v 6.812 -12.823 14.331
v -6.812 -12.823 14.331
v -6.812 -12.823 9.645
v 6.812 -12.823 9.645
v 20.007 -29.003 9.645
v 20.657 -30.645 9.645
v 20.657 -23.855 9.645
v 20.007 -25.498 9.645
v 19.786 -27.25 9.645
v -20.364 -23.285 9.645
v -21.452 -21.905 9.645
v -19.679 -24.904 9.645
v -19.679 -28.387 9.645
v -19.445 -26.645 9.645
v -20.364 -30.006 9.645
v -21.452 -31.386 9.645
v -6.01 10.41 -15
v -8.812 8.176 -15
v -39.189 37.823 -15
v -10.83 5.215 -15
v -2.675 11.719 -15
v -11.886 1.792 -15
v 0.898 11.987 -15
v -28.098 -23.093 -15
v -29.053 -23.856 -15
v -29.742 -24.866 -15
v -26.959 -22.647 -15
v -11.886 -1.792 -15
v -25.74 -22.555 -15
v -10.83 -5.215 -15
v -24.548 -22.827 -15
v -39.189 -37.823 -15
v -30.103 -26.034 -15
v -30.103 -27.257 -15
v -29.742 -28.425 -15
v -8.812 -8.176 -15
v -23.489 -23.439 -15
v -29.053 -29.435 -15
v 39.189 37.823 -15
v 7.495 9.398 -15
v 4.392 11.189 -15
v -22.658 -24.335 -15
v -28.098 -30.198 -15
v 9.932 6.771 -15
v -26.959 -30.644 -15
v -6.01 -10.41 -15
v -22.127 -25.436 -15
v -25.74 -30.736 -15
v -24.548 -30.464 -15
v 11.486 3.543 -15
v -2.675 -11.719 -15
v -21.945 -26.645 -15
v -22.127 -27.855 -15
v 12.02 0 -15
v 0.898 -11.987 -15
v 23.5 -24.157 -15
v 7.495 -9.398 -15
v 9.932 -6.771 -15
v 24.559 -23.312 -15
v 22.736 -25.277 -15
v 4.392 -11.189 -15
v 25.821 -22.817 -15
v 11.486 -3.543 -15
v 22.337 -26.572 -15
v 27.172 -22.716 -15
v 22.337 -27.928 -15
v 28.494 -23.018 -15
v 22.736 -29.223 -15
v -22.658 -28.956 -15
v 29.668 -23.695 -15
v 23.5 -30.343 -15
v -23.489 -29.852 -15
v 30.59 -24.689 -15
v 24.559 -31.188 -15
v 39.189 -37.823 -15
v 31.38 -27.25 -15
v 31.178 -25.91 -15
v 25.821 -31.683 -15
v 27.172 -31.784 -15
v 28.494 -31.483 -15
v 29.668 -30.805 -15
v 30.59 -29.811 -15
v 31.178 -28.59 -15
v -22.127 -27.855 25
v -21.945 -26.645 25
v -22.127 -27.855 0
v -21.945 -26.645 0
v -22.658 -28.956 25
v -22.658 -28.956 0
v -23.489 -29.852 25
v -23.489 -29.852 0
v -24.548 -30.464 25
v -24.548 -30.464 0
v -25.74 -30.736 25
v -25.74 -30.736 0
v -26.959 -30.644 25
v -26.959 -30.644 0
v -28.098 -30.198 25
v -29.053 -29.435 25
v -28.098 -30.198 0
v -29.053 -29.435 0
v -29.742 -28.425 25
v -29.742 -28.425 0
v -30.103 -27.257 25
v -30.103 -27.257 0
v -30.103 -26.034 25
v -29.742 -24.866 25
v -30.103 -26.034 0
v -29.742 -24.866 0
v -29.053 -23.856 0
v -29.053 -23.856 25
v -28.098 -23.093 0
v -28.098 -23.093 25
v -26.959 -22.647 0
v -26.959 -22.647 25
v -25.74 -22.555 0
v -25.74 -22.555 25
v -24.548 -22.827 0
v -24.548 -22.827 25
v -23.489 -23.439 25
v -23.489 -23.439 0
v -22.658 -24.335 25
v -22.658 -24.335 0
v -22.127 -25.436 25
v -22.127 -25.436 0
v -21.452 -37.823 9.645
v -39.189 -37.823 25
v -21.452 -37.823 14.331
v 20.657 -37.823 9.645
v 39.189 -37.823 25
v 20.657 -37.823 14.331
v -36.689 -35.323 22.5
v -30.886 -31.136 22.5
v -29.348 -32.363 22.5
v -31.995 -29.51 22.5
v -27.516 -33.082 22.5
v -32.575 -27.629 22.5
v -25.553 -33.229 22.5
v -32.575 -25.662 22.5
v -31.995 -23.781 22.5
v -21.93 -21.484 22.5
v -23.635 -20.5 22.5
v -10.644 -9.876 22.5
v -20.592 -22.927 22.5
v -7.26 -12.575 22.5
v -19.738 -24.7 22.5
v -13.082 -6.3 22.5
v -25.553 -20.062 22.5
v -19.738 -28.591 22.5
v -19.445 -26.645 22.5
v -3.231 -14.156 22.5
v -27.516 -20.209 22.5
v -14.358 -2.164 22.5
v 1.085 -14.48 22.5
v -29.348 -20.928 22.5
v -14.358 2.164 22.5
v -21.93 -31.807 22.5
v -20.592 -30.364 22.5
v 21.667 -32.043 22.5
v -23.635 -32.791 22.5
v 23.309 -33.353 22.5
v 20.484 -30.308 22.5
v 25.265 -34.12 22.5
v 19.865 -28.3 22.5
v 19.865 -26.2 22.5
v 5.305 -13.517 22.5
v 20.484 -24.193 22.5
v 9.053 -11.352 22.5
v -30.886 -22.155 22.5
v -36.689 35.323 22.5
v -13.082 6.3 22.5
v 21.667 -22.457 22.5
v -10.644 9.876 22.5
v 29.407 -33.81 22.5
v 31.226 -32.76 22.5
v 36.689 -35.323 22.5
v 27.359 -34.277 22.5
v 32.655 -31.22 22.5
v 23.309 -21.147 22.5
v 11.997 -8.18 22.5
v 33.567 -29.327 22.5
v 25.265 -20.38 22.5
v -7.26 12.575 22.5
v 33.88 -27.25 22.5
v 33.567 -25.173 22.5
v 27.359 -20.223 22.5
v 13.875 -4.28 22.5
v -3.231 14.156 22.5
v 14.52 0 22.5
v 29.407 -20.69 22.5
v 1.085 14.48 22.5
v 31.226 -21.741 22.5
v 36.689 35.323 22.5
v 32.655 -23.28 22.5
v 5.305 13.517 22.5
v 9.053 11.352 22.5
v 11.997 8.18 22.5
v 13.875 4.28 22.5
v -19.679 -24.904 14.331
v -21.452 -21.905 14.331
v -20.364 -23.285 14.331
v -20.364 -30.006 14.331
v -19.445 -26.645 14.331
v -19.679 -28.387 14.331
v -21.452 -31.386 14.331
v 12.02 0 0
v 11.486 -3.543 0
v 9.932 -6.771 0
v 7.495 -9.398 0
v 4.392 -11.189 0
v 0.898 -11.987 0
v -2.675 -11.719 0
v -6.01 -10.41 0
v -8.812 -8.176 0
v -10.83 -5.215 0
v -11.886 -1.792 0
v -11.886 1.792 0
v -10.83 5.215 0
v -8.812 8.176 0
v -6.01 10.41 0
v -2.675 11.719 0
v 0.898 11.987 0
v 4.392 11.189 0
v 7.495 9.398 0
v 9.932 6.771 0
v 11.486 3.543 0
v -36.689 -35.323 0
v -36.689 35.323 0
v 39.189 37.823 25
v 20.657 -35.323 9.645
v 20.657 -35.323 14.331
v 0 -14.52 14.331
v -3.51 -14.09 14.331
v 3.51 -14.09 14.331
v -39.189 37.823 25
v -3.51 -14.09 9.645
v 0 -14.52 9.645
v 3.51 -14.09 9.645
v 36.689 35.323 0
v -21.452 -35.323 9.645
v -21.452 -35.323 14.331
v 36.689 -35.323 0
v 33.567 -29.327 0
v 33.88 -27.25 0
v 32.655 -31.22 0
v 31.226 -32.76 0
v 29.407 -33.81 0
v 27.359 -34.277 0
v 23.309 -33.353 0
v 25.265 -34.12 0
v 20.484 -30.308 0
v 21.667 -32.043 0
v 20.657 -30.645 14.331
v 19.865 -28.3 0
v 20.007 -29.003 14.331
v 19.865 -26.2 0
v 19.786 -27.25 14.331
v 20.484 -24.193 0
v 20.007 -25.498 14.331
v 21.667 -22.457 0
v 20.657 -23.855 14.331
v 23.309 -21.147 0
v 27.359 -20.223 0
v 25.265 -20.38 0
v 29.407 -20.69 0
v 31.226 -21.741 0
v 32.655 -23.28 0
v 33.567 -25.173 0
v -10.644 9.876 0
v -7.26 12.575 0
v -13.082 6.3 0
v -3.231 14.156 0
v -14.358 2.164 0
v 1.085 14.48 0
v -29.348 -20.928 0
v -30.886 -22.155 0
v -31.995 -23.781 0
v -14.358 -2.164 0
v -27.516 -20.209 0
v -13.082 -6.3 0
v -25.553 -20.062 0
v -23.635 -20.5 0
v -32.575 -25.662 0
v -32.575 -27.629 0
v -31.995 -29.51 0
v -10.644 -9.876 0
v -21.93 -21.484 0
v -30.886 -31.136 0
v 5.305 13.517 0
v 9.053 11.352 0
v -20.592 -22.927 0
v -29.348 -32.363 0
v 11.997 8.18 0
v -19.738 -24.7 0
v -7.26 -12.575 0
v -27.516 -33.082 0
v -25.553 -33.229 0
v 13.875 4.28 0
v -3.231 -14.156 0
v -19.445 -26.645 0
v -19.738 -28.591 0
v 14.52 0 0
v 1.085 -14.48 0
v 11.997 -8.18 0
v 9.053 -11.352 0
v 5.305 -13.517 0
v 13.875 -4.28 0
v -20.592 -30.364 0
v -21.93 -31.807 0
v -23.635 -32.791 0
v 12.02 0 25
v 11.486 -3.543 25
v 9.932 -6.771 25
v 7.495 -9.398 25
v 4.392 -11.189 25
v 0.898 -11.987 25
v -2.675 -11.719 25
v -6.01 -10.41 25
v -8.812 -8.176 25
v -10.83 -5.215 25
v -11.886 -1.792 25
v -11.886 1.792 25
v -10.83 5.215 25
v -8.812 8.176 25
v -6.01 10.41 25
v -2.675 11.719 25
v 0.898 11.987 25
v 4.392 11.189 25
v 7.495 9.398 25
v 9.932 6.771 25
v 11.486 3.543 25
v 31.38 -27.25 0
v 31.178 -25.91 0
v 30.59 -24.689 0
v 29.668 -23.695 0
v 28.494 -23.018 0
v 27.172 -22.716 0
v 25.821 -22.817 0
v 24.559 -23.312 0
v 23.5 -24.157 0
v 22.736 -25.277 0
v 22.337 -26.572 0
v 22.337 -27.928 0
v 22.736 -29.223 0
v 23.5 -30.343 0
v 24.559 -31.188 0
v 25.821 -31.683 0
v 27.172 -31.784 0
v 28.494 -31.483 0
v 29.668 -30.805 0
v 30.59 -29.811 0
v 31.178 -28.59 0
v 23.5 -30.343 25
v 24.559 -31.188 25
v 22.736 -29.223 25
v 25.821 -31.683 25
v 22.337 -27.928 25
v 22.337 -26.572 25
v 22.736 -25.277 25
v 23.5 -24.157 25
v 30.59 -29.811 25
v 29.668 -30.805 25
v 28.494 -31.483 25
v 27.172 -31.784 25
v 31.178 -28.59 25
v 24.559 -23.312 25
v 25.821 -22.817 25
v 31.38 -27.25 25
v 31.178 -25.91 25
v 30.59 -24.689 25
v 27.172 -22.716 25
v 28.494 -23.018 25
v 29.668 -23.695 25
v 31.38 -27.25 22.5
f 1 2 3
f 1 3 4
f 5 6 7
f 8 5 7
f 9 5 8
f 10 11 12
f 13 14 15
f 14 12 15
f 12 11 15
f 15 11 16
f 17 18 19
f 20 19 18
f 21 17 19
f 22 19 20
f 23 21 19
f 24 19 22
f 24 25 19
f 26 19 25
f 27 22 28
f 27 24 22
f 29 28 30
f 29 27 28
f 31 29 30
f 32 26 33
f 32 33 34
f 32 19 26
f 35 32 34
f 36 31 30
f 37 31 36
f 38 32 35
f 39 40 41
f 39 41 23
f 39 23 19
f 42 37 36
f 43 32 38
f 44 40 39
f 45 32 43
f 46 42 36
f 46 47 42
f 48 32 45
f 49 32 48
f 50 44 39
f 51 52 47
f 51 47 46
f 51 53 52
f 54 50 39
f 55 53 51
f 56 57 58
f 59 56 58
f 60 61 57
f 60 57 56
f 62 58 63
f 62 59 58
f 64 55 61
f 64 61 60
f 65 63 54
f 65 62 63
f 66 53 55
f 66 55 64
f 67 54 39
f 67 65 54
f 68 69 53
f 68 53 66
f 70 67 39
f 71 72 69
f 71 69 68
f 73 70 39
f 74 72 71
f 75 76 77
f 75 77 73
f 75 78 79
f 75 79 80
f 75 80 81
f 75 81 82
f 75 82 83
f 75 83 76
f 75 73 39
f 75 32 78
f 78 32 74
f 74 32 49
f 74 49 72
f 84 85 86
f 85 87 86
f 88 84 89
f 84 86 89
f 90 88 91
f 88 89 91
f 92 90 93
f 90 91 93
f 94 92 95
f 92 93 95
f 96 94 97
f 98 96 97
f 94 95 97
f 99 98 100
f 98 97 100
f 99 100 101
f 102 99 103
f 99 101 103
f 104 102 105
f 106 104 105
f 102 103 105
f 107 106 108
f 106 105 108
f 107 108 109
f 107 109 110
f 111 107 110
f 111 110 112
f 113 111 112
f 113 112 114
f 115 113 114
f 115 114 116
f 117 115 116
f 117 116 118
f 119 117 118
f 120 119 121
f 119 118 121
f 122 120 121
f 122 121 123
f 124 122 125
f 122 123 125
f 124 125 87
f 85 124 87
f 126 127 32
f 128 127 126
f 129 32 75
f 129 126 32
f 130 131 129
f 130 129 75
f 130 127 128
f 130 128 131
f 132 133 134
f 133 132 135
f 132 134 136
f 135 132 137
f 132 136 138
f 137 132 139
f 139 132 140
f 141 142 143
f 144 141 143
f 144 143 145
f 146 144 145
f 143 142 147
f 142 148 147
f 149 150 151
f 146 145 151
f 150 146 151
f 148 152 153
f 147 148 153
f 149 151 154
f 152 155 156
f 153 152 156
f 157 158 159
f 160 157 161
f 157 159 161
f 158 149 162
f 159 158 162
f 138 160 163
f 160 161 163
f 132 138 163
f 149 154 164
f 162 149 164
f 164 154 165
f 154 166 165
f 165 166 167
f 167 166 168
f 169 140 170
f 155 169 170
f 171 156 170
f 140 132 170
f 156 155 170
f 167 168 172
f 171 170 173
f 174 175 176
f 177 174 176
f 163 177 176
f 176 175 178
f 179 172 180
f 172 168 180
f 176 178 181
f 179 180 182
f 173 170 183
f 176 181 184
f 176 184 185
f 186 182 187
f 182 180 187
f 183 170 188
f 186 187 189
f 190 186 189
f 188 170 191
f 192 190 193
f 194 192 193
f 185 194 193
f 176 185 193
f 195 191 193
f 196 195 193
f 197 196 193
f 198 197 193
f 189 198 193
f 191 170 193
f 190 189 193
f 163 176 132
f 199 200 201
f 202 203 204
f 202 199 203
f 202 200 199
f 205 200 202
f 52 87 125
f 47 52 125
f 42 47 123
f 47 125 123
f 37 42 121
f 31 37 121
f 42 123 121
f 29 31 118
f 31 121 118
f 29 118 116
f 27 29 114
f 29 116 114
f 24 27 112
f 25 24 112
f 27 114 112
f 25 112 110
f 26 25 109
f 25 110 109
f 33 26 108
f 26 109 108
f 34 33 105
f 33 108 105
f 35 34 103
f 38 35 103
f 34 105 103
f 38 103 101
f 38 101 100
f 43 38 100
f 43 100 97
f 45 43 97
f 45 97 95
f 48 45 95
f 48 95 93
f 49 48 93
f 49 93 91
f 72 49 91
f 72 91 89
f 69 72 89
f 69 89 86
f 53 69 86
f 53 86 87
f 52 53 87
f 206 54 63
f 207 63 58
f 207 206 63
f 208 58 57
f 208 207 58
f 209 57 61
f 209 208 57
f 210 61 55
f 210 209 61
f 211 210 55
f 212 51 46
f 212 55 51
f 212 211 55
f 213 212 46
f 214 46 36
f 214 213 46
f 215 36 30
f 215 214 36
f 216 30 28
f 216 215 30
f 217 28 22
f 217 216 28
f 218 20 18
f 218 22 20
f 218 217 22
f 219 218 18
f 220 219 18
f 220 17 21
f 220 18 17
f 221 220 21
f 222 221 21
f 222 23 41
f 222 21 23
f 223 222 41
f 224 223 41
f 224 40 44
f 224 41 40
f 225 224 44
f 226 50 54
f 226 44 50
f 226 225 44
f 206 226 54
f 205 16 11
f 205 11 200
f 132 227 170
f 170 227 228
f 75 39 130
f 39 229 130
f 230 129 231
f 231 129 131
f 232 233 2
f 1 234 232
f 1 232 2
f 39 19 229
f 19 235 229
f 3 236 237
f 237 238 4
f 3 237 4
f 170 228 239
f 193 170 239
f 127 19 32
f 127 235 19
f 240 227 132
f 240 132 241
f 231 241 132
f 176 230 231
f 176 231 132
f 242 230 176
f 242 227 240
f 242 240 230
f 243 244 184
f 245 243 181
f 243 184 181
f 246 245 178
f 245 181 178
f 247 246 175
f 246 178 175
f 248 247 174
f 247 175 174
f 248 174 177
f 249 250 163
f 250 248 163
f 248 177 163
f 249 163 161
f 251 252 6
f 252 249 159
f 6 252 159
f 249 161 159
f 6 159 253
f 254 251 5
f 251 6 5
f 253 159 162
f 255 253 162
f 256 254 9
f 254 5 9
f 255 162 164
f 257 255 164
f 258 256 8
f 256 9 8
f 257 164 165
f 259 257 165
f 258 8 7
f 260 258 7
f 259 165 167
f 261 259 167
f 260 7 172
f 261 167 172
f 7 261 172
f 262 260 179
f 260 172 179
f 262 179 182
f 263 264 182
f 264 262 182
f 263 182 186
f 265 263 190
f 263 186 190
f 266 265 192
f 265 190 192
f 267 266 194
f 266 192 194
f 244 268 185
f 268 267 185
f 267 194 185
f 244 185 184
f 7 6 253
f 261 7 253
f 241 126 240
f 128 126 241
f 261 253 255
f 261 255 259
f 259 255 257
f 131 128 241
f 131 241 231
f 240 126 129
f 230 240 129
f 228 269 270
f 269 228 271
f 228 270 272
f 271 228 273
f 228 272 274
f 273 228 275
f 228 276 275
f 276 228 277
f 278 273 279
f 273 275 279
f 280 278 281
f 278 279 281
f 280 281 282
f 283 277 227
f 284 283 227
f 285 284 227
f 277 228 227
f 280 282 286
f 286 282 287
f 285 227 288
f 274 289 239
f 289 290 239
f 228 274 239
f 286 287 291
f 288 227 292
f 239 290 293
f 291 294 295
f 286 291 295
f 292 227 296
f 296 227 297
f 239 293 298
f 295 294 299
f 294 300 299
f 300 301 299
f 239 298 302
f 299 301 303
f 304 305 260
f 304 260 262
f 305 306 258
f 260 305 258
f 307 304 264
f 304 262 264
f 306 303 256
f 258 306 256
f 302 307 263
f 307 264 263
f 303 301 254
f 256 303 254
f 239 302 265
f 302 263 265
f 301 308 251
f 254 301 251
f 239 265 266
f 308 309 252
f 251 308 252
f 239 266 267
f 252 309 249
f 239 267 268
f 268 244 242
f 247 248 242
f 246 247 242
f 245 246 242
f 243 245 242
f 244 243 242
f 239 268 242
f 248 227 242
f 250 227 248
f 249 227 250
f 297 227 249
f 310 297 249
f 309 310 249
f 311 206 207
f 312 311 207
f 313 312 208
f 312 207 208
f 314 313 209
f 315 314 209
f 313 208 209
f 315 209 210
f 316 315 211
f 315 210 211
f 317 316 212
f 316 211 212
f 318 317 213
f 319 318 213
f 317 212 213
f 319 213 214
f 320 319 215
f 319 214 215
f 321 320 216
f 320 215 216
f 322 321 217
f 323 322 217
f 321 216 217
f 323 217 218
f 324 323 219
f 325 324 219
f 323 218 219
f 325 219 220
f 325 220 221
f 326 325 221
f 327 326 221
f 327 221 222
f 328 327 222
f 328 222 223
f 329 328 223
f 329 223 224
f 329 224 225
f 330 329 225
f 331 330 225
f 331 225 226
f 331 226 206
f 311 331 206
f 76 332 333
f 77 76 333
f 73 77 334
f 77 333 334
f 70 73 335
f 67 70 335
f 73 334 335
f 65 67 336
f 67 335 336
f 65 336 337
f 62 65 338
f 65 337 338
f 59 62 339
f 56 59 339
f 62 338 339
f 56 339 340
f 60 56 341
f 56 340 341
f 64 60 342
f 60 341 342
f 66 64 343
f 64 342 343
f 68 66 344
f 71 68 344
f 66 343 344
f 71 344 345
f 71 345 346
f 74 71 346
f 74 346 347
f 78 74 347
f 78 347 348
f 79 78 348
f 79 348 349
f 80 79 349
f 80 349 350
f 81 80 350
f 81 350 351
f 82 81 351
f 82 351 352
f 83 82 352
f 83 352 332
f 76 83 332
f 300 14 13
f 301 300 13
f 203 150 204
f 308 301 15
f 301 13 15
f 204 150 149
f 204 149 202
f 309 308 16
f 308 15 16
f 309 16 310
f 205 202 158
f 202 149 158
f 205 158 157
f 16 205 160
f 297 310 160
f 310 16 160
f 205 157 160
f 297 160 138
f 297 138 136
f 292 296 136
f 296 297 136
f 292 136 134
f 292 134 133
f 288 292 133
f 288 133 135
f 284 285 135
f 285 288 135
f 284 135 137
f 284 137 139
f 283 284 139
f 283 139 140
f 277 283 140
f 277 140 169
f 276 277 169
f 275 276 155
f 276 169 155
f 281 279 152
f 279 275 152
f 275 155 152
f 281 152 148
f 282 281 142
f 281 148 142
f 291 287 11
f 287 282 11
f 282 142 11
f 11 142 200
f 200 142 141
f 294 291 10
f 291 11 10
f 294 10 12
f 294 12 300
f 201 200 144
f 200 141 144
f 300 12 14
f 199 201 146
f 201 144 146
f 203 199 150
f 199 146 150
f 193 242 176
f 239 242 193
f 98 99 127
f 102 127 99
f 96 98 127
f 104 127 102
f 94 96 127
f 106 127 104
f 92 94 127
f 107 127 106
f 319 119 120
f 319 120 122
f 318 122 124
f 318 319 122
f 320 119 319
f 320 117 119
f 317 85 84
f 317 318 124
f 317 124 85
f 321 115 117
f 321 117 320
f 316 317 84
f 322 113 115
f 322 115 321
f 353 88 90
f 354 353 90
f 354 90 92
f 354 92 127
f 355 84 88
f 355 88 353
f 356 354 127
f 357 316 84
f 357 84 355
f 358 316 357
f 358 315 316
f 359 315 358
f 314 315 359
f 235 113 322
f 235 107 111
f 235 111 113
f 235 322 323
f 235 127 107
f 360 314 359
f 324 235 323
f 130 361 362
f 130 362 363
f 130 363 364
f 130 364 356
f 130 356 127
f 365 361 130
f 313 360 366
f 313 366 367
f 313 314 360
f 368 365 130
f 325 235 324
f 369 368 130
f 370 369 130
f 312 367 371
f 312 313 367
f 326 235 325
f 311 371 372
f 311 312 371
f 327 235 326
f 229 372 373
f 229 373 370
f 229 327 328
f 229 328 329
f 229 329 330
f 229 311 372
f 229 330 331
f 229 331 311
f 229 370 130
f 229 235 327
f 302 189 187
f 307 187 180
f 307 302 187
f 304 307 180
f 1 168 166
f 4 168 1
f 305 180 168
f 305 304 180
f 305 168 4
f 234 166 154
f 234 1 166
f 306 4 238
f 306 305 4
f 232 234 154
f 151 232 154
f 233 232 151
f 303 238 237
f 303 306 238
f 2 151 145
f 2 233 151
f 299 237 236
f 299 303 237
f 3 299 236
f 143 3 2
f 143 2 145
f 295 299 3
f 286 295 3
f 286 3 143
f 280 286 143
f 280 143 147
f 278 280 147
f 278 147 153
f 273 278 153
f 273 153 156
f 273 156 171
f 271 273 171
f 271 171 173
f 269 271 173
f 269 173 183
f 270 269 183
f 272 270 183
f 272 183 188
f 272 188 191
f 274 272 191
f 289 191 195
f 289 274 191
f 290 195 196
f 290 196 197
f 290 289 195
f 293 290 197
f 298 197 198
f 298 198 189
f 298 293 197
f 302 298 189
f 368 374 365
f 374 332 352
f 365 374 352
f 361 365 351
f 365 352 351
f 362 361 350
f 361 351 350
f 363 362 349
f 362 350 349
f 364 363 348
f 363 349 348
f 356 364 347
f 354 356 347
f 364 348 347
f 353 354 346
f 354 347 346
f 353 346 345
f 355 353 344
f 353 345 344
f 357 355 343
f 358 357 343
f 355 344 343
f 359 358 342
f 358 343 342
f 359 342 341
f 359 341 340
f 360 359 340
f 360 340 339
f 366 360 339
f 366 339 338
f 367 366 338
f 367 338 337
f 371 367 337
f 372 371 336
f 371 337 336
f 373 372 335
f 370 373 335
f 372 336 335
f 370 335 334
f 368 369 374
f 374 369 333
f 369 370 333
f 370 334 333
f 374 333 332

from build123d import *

# Parameters (mm, degrees)
F0_W         = 78.3775448799
F0_H         = 75.6465569139
F1_DEPTH     = 25
F2_R         = 12.0203528279
F3_DEPTH     = 49.9
F4_T         = -2.5
F5_R         = 6.6018014855
F6_DEPTH     = 25
F7_T         = 2.5
F7_T3_DEPTH  = 27.5
F7_T5_DEPTH  = 78.3775448799
F7_T7_DEPTH  = 75.6465569139
F8_DEPTH     = 25
F9_R         = 7.0468826158
F10_DEPTH    = 25
F11_T        = 2.5
F11_T3_DEPTH = 27.5
F11_T5_DEPTH = 78.3775448799
F11_T7_DEPTH = 75.6465569139
F12_DEPTH    = 25
F13_W        = 42.1091411263
F13_H        = 4.6861004084
F14_DEPTH    = 25
F15_W        = 78.3775448799
F15_H        = 75.6465569139
F16_DEPTH    = 15
F17_R        = 10.5957056812
F18_DEPTH    = 25
F19_DEPTH    = 25
F20_DEPTH    = 25
F21_DEPTH    = 25


# Not quite as in the source:
# - a shell that OpenCascade refuses in one call is made with other operations: the cavity is built on its own and cut out


with BuildPart() as f1:
    # F0 (on Top) → F1 (new body)
    with BuildSketch(Plane.XY):
        Rectangle(F0_W, F0_H)
    extrude(amount=F1_DEPTH)

    # F2 (on face) → F3 (cut)
    with BuildSketch(Plane(origin=(0, 0, 0), x_dir=(1, 0, 0), z_dir=(0, 0, -1))):
        Circle(F2_R)
    extrude(amount=-F3_DEPTH, mode=Mode.SUBTRACT)

    # F4
    f4_openings = [f1.faces().sort_by_distance(p)[0] for p in [
        (0, 36.733992, 0),
    ]]
    offset(amount=F4_T, openings=f4_openings)

    # F5 (on face) → F6 (join)
    with BuildSketch(Plane(origin=(0, 0, 22.5), x_dir=(1, 0, 0), z_dir=(0, 0, -1))):
        with Locations((-26.0466337204, 26.645489037)):
            Circle(F5_R)
    extrude(amount=F6_DEPTH)

    # F7: shell of thickness 2.5, made by hand


with BuildPart() as f7_core1:
    # F7_t2: copy of F1
    add(f1.part)

    # the walls: a layer under each face that stays
    f7_faces = [f7_core1.faces().sort_by_distance(p)[0] for p in [
        (0, 37.8232784569, 12.5),
        (39.18877244, 0, 12.5),
        (-39.18877244, 0, 12.5),
        (-36.7394741625, 7.0043108254, 0),
        (-26.1258482933, -25.2155189713, 25),
        (0, -37.8232784569, 12.5),
        (0, 35.3232784569, 11.25),
        (36.68877244, 0, 11.25),
        (0, -35.3232784569, 11.25),
        (-36.68877244, 0, 11.25),
        (-12.0203528279, 0, 12.5),
        (-24.4591816266, 0, 22.5),
        (-9.6802352186, -9.6802352186, 0),
        (-32.6484352059, -26.645489037, 10),
        (-14.5203528279, 0, 11.25),
    ]]
    thicken(f7_faces, amount=-F7_T, mode=Mode.SUBTRACT)

    # F7_s4 → F7_t3 (cut)
    with BuildSketch(Plane.XY.offset(-2.5)):
        Polygon((36.66377244, 35.2982784569), (36.68877244, 37.8232784569), (39.18877244, 37.8232784569), (39.18877244, 35.3232784569), align=None)
        Polygon((-36.66377244, 35.2982784569), (-36.68877244, 37.8232784569), (-39.18877244, 37.8232784569), (-39.18877244, 35.3232784569), align=None)
        Polygon((36.66377244, -35.2982784569), (39.18877244, -35.3232784569), (39.18877244, -37.8232784569), (36.68877244, -37.8232784569), align=None)
        Polygon((-36.66377244, -35.2982784569), (-36.68877244, -37.8232784569), (-39.18877244, -37.8232784569), (-39.18877244, -35.3232784569), align=None)
    extrude(amount=F7_T3_DEPTH, mode=Mode.SUBTRACT)

    # F7_s6 → F7_t5 (cut)
    with BuildSketch(Plane.YZ.offset(-39.18877244)):
        Polygon((35.2982784569, 22.475), (37.8232784569, 22.5), (37.8232784569, 25), (35.3232784569, 25), align=None)
        Polygon((-35.2982784569, 22.475), (-37.8232784569, 22.5), (-37.8232784569, 25), (-35.3232784569, 25), align=None)
    extrude(amount=F7_T5_DEPTH, mode=Mode.SUBTRACT)

    # F7_s8 → F7_t7 (cut)
    with BuildSketch(Plane.XZ.offset(-37.8232784569)):
        Polygon((36.66377244, 22.475), (39.18877244, 22.5), (39.18877244, 25), (36.68877244, 25), align=None)
        Polygon((-36.66377244, 22.475), (-39.18877244, 22.5), (-39.18877244, 25), (-36.68877244, 25), align=None)
    extrude(amount=F7_T7_DEPTH, mode=Mode.SUBTRACT)

    # F7_s9 → F7_t10 (revolve, cut)
    with BuildSketch(Plane.XZ.offset(26.645489037)):
        Polygon((-19.4198322349, 22.475), (-19.4448322349, 25), (-21.9448322349, 25), (-21.9448322349, 22.5), align=None)
    revolve(axis=Axis((-26.0466337204, -26.645489037, 22.5), (0, 0, -1)), mode=Mode.SUBTRACT)

    # F7_s11 → F7_t12 (revolve, cut)
    with BuildSketch(Plane.XZ):
        Polygon((14.5453528279, 22.475), (14.5203528279, 25), (12.0203528279, 25), (12.0203528279, 22.5), align=None)
    revolve(axis=Axis((0, 0, 22.5), (0, 0, -1)), mode=Mode.SUBTRACT)


with BuildPart() as f1_1:
    add(f1.part)

    # what is left inside the walls is the cavity
    f7_cavity = [f7_core1.part.solids().sort_by_distance(p)[0] for p in [
        (-30.123435, -26.645489, 5.833333),
    ]]
    add(f7_cavity, mode=Mode.SUBTRACT)

    # F8 (cut): a face of the model
    f8_faces = [f1_1.faces().sort_by_distance(p)[0] for p in [
        (-26.0466337204, -26.645489037, 22.5),
    ]]
    extrude(f8_faces, amount=-F8_DEPTH, mode=Mode.SUBTRACT)

    # F9 (on face) → F10 (join)
    with BuildSketch(Plane(origin=(0, 0, 22.5), x_dir=(1, 0, 0), z_dir=(0, 0, -1))):
        with Locations((26.8326979131, 27.2501390427)):
            Circle(F9_R)
    extrude(amount=F10_DEPTH)

    # F11: shell of thickness 2.5, made by hand


with BuildPart() as f11_core1:
    # F11_t2: copy of F1
    add(f1_1.part)

    # the walls: a layer under each face that stays
    f11_faces = [f11_core1.faces().sort_by_distance(p)[0] for p in [
        (0, 37.8232784569, 12.5),
        (39.18877244, 0, 12.5),
        (-39.18877244, 0, 12.5),
        (-36.7394741625, 7.0043108254, 0),
        (-26.1258482933, 0, 25),
        (0, -37.8232784569, 12.5),
        (0, 35.3232784569, 11.25),
        (36.68877244, 0, 11.25),
        (0, -35.3232784569, 11.25),
        (-36.68877244, 0, 11.25),
        (-30.1484352059, -26.645489037, 23.75),
        (-12.0203528279, 0, 12.5),
        (-24.4591816266, 0, 22.5),
        (-30.1484352059, -26.645489037, 10),
        (-9.6802352186, -9.6802352186, 0),
        (-32.6484352059, -26.645489037, 10),
        (19.7858152973, -27.2501390427, 10),
        (-14.5203528279, 0, 11.25),
        (-30.4478347107, -22.2442880467, -2.5),
    ]]
    thicken(f11_faces, amount=-F11_T, mode=Mode.SUBTRACT)

    # F11_s4 → F11_t3 (cut)
    with BuildSketch(Plane.XY.offset(-2.5)):
        Polygon((36.66377244, 35.2982784569), (36.68877244, 37.8232784569), (39.18877244, 37.8232784569), (39.18877244, 35.3232784569), align=None)
        Polygon((-36.66377244, 35.2982784569), (-36.68877244, 37.8232784569), (-39.18877244, 37.8232784569), (-39.18877244, 35.3232784569), align=None)
        Polygon((36.66377244, -35.2982784569), (39.18877244, -35.3232784569), (39.18877244, -37.8232784569), (36.68877244, -37.8232784569), align=None)
        Polygon((-36.66377244, -35.2982784569), (-36.68877244, -37.8232784569), (-39.18877244, -37.8232784569), (-39.18877244, -35.3232784569), align=None)
    extrude(amount=F11_T3_DEPTH, mode=Mode.SUBTRACT)

    # F11_s6 → F11_t5 (cut)
    with BuildSketch(Plane.YZ.offset(-39.18877244)):
        Polygon((35.2982784569, 22.475), (37.8232784569, 22.5), (37.8232784569, 25), (35.3232784569, 25), align=None)
        Polygon((-35.2982784569, 22.475), (-37.8232784569, 22.5), (-37.8232784569, 25), (-35.3232784569, 25), align=None)
    extrude(amount=F11_T5_DEPTH, mode=Mode.SUBTRACT)

    # F11_s8 → F11_t7 (cut)
    with BuildSketch(Plane.XZ.offset(-37.8232784569)):
        Polygon((36.66377244, 22.475), (39.18877244, 22.5), (39.18877244, 25), (36.68877244, 25), align=None)
        Polygon((-36.66377244, 22.475), (-39.18877244, 22.5), (-39.18877244, 25), (-36.68877244, 25), align=None)
    extrude(amount=F11_T7_DEPTH, mode=Mode.SUBTRACT)

    # F11_s9 → F11_t10 (revolve, cut)
    with BuildSketch(Plane.XZ.offset(26.645489037)):
        Polygon((-19.4198322349, 22.475), (-19.4448322349, 25), (-21.9448322349, 25), (-21.9448322349, 22.5), align=None)
    revolve(axis=Axis((-26.0466337204, -26.645489037, 22.5), (0, 0, -1)), mode=Mode.SUBTRACT)

    # F11_s11 → F11_t12 (revolve, cut)
    with BuildSketch(Plane.XZ.offset(27.2501390427)):
        Polygon((33.9045805288, 22.475), (33.8795805288, 25), (31.3795805288, 25), (31.3795805288, 22.5), align=None)
    revolve(axis=Axis((26.8326979131, -27.2501390427, 22.5), (0, 0, -1)), mode=Mode.SUBTRACT)

    # F11_s13 → F11_t14 (revolve, cut)
    with BuildSketch(Plane.XZ):
        Polygon((14.5453528279, 22.475), (14.5203528279, 25), (12.0203528279, 25), (12.0203528279, 22.5), align=None)
    revolve(axis=Axis((0, 0, 22.5), (0, 0, -1)), mode=Mode.SUBTRACT)


with BuildPart() as f1_2:
    add(f1_1.part)

    # what is left inside the walls is the cavity
    f11_cavity = [f11_core1.part.solids().sort_by_distance(p)[0] for p in [
        (22.310815, -27.250139, 5.833333),
    ]]
    add(f11_cavity, mode=Mode.SUBTRACT)

    # F12 (cut): a face of the model
    f12_faces = [f1_2.faces().sort_by_distance(p)[0] for p in [
        (26.8326979131, -27.2501390427, 22.5),
    ]]
    extrude(f12_faces, amount=-F12_DEPTH, mode=Mode.SUBTRACT)

    # F13 (on face) → F14 (cut)
    with BuildSketch(Plane.XZ.offset(37.8232784569)):
        with Locations((-0.3970777616, 11.9879292324)):
            Rectangle(F13_W, F13_H)
    extrude(amount=-F14_DEPTH, mode=Mode.SUBTRACT)

    # F15 (on face) → F16 (join)
    with BuildSketch(Plane(origin=(0, 0, 0), x_dir=(1, 0, 0), z_dir=(0, 0, -1))):
        Rectangle(F15_W, F15_H)
    extrude(amount=F16_DEPTH)

    # F17 (on face) → F18 (cut)
    with BuildSketch(Plane(origin=(0, 0, -15), x_dir=(1, 0, 0), z_dir=(0, 0, -1))):
        with Locations((-27.1771177649, 22.4702265114)):
            Circle(F17_R)
    extrude(amount=F18_DEPTH, mode=Mode.SUBTRACT)

    # F19 (cut): a face of the model
    f19_faces = [f1_2.faces().sort_by_distance(p)[0] for p in [
        (0, 0, 0),
    ]]
    extrude(f19_faces, amount=-F19_DEPTH, mode=Mode.SUBTRACT)

    # F20 (cut): a face of the model
    f20_faces = [f1_2.faces().sort_by_distance(p)[0] for p in [
        (-26.0466337204, -26.645489037, 0),
    ]]
    extrude(f20_faces, amount=-F20_DEPTH, mode=Mode.SUBTRACT)

    # F21 (cut): a face of the model
    f21_faces = [f1_2.faces().sort_by_distance(p)[0] for p in [
        (26.8326979131, -27.2501390427, 0),
    ]]
    extrude(f21_faces, amount=-F21_DEPTH, mode=Mode.SUBTRACT)


solid = f1_2.part
